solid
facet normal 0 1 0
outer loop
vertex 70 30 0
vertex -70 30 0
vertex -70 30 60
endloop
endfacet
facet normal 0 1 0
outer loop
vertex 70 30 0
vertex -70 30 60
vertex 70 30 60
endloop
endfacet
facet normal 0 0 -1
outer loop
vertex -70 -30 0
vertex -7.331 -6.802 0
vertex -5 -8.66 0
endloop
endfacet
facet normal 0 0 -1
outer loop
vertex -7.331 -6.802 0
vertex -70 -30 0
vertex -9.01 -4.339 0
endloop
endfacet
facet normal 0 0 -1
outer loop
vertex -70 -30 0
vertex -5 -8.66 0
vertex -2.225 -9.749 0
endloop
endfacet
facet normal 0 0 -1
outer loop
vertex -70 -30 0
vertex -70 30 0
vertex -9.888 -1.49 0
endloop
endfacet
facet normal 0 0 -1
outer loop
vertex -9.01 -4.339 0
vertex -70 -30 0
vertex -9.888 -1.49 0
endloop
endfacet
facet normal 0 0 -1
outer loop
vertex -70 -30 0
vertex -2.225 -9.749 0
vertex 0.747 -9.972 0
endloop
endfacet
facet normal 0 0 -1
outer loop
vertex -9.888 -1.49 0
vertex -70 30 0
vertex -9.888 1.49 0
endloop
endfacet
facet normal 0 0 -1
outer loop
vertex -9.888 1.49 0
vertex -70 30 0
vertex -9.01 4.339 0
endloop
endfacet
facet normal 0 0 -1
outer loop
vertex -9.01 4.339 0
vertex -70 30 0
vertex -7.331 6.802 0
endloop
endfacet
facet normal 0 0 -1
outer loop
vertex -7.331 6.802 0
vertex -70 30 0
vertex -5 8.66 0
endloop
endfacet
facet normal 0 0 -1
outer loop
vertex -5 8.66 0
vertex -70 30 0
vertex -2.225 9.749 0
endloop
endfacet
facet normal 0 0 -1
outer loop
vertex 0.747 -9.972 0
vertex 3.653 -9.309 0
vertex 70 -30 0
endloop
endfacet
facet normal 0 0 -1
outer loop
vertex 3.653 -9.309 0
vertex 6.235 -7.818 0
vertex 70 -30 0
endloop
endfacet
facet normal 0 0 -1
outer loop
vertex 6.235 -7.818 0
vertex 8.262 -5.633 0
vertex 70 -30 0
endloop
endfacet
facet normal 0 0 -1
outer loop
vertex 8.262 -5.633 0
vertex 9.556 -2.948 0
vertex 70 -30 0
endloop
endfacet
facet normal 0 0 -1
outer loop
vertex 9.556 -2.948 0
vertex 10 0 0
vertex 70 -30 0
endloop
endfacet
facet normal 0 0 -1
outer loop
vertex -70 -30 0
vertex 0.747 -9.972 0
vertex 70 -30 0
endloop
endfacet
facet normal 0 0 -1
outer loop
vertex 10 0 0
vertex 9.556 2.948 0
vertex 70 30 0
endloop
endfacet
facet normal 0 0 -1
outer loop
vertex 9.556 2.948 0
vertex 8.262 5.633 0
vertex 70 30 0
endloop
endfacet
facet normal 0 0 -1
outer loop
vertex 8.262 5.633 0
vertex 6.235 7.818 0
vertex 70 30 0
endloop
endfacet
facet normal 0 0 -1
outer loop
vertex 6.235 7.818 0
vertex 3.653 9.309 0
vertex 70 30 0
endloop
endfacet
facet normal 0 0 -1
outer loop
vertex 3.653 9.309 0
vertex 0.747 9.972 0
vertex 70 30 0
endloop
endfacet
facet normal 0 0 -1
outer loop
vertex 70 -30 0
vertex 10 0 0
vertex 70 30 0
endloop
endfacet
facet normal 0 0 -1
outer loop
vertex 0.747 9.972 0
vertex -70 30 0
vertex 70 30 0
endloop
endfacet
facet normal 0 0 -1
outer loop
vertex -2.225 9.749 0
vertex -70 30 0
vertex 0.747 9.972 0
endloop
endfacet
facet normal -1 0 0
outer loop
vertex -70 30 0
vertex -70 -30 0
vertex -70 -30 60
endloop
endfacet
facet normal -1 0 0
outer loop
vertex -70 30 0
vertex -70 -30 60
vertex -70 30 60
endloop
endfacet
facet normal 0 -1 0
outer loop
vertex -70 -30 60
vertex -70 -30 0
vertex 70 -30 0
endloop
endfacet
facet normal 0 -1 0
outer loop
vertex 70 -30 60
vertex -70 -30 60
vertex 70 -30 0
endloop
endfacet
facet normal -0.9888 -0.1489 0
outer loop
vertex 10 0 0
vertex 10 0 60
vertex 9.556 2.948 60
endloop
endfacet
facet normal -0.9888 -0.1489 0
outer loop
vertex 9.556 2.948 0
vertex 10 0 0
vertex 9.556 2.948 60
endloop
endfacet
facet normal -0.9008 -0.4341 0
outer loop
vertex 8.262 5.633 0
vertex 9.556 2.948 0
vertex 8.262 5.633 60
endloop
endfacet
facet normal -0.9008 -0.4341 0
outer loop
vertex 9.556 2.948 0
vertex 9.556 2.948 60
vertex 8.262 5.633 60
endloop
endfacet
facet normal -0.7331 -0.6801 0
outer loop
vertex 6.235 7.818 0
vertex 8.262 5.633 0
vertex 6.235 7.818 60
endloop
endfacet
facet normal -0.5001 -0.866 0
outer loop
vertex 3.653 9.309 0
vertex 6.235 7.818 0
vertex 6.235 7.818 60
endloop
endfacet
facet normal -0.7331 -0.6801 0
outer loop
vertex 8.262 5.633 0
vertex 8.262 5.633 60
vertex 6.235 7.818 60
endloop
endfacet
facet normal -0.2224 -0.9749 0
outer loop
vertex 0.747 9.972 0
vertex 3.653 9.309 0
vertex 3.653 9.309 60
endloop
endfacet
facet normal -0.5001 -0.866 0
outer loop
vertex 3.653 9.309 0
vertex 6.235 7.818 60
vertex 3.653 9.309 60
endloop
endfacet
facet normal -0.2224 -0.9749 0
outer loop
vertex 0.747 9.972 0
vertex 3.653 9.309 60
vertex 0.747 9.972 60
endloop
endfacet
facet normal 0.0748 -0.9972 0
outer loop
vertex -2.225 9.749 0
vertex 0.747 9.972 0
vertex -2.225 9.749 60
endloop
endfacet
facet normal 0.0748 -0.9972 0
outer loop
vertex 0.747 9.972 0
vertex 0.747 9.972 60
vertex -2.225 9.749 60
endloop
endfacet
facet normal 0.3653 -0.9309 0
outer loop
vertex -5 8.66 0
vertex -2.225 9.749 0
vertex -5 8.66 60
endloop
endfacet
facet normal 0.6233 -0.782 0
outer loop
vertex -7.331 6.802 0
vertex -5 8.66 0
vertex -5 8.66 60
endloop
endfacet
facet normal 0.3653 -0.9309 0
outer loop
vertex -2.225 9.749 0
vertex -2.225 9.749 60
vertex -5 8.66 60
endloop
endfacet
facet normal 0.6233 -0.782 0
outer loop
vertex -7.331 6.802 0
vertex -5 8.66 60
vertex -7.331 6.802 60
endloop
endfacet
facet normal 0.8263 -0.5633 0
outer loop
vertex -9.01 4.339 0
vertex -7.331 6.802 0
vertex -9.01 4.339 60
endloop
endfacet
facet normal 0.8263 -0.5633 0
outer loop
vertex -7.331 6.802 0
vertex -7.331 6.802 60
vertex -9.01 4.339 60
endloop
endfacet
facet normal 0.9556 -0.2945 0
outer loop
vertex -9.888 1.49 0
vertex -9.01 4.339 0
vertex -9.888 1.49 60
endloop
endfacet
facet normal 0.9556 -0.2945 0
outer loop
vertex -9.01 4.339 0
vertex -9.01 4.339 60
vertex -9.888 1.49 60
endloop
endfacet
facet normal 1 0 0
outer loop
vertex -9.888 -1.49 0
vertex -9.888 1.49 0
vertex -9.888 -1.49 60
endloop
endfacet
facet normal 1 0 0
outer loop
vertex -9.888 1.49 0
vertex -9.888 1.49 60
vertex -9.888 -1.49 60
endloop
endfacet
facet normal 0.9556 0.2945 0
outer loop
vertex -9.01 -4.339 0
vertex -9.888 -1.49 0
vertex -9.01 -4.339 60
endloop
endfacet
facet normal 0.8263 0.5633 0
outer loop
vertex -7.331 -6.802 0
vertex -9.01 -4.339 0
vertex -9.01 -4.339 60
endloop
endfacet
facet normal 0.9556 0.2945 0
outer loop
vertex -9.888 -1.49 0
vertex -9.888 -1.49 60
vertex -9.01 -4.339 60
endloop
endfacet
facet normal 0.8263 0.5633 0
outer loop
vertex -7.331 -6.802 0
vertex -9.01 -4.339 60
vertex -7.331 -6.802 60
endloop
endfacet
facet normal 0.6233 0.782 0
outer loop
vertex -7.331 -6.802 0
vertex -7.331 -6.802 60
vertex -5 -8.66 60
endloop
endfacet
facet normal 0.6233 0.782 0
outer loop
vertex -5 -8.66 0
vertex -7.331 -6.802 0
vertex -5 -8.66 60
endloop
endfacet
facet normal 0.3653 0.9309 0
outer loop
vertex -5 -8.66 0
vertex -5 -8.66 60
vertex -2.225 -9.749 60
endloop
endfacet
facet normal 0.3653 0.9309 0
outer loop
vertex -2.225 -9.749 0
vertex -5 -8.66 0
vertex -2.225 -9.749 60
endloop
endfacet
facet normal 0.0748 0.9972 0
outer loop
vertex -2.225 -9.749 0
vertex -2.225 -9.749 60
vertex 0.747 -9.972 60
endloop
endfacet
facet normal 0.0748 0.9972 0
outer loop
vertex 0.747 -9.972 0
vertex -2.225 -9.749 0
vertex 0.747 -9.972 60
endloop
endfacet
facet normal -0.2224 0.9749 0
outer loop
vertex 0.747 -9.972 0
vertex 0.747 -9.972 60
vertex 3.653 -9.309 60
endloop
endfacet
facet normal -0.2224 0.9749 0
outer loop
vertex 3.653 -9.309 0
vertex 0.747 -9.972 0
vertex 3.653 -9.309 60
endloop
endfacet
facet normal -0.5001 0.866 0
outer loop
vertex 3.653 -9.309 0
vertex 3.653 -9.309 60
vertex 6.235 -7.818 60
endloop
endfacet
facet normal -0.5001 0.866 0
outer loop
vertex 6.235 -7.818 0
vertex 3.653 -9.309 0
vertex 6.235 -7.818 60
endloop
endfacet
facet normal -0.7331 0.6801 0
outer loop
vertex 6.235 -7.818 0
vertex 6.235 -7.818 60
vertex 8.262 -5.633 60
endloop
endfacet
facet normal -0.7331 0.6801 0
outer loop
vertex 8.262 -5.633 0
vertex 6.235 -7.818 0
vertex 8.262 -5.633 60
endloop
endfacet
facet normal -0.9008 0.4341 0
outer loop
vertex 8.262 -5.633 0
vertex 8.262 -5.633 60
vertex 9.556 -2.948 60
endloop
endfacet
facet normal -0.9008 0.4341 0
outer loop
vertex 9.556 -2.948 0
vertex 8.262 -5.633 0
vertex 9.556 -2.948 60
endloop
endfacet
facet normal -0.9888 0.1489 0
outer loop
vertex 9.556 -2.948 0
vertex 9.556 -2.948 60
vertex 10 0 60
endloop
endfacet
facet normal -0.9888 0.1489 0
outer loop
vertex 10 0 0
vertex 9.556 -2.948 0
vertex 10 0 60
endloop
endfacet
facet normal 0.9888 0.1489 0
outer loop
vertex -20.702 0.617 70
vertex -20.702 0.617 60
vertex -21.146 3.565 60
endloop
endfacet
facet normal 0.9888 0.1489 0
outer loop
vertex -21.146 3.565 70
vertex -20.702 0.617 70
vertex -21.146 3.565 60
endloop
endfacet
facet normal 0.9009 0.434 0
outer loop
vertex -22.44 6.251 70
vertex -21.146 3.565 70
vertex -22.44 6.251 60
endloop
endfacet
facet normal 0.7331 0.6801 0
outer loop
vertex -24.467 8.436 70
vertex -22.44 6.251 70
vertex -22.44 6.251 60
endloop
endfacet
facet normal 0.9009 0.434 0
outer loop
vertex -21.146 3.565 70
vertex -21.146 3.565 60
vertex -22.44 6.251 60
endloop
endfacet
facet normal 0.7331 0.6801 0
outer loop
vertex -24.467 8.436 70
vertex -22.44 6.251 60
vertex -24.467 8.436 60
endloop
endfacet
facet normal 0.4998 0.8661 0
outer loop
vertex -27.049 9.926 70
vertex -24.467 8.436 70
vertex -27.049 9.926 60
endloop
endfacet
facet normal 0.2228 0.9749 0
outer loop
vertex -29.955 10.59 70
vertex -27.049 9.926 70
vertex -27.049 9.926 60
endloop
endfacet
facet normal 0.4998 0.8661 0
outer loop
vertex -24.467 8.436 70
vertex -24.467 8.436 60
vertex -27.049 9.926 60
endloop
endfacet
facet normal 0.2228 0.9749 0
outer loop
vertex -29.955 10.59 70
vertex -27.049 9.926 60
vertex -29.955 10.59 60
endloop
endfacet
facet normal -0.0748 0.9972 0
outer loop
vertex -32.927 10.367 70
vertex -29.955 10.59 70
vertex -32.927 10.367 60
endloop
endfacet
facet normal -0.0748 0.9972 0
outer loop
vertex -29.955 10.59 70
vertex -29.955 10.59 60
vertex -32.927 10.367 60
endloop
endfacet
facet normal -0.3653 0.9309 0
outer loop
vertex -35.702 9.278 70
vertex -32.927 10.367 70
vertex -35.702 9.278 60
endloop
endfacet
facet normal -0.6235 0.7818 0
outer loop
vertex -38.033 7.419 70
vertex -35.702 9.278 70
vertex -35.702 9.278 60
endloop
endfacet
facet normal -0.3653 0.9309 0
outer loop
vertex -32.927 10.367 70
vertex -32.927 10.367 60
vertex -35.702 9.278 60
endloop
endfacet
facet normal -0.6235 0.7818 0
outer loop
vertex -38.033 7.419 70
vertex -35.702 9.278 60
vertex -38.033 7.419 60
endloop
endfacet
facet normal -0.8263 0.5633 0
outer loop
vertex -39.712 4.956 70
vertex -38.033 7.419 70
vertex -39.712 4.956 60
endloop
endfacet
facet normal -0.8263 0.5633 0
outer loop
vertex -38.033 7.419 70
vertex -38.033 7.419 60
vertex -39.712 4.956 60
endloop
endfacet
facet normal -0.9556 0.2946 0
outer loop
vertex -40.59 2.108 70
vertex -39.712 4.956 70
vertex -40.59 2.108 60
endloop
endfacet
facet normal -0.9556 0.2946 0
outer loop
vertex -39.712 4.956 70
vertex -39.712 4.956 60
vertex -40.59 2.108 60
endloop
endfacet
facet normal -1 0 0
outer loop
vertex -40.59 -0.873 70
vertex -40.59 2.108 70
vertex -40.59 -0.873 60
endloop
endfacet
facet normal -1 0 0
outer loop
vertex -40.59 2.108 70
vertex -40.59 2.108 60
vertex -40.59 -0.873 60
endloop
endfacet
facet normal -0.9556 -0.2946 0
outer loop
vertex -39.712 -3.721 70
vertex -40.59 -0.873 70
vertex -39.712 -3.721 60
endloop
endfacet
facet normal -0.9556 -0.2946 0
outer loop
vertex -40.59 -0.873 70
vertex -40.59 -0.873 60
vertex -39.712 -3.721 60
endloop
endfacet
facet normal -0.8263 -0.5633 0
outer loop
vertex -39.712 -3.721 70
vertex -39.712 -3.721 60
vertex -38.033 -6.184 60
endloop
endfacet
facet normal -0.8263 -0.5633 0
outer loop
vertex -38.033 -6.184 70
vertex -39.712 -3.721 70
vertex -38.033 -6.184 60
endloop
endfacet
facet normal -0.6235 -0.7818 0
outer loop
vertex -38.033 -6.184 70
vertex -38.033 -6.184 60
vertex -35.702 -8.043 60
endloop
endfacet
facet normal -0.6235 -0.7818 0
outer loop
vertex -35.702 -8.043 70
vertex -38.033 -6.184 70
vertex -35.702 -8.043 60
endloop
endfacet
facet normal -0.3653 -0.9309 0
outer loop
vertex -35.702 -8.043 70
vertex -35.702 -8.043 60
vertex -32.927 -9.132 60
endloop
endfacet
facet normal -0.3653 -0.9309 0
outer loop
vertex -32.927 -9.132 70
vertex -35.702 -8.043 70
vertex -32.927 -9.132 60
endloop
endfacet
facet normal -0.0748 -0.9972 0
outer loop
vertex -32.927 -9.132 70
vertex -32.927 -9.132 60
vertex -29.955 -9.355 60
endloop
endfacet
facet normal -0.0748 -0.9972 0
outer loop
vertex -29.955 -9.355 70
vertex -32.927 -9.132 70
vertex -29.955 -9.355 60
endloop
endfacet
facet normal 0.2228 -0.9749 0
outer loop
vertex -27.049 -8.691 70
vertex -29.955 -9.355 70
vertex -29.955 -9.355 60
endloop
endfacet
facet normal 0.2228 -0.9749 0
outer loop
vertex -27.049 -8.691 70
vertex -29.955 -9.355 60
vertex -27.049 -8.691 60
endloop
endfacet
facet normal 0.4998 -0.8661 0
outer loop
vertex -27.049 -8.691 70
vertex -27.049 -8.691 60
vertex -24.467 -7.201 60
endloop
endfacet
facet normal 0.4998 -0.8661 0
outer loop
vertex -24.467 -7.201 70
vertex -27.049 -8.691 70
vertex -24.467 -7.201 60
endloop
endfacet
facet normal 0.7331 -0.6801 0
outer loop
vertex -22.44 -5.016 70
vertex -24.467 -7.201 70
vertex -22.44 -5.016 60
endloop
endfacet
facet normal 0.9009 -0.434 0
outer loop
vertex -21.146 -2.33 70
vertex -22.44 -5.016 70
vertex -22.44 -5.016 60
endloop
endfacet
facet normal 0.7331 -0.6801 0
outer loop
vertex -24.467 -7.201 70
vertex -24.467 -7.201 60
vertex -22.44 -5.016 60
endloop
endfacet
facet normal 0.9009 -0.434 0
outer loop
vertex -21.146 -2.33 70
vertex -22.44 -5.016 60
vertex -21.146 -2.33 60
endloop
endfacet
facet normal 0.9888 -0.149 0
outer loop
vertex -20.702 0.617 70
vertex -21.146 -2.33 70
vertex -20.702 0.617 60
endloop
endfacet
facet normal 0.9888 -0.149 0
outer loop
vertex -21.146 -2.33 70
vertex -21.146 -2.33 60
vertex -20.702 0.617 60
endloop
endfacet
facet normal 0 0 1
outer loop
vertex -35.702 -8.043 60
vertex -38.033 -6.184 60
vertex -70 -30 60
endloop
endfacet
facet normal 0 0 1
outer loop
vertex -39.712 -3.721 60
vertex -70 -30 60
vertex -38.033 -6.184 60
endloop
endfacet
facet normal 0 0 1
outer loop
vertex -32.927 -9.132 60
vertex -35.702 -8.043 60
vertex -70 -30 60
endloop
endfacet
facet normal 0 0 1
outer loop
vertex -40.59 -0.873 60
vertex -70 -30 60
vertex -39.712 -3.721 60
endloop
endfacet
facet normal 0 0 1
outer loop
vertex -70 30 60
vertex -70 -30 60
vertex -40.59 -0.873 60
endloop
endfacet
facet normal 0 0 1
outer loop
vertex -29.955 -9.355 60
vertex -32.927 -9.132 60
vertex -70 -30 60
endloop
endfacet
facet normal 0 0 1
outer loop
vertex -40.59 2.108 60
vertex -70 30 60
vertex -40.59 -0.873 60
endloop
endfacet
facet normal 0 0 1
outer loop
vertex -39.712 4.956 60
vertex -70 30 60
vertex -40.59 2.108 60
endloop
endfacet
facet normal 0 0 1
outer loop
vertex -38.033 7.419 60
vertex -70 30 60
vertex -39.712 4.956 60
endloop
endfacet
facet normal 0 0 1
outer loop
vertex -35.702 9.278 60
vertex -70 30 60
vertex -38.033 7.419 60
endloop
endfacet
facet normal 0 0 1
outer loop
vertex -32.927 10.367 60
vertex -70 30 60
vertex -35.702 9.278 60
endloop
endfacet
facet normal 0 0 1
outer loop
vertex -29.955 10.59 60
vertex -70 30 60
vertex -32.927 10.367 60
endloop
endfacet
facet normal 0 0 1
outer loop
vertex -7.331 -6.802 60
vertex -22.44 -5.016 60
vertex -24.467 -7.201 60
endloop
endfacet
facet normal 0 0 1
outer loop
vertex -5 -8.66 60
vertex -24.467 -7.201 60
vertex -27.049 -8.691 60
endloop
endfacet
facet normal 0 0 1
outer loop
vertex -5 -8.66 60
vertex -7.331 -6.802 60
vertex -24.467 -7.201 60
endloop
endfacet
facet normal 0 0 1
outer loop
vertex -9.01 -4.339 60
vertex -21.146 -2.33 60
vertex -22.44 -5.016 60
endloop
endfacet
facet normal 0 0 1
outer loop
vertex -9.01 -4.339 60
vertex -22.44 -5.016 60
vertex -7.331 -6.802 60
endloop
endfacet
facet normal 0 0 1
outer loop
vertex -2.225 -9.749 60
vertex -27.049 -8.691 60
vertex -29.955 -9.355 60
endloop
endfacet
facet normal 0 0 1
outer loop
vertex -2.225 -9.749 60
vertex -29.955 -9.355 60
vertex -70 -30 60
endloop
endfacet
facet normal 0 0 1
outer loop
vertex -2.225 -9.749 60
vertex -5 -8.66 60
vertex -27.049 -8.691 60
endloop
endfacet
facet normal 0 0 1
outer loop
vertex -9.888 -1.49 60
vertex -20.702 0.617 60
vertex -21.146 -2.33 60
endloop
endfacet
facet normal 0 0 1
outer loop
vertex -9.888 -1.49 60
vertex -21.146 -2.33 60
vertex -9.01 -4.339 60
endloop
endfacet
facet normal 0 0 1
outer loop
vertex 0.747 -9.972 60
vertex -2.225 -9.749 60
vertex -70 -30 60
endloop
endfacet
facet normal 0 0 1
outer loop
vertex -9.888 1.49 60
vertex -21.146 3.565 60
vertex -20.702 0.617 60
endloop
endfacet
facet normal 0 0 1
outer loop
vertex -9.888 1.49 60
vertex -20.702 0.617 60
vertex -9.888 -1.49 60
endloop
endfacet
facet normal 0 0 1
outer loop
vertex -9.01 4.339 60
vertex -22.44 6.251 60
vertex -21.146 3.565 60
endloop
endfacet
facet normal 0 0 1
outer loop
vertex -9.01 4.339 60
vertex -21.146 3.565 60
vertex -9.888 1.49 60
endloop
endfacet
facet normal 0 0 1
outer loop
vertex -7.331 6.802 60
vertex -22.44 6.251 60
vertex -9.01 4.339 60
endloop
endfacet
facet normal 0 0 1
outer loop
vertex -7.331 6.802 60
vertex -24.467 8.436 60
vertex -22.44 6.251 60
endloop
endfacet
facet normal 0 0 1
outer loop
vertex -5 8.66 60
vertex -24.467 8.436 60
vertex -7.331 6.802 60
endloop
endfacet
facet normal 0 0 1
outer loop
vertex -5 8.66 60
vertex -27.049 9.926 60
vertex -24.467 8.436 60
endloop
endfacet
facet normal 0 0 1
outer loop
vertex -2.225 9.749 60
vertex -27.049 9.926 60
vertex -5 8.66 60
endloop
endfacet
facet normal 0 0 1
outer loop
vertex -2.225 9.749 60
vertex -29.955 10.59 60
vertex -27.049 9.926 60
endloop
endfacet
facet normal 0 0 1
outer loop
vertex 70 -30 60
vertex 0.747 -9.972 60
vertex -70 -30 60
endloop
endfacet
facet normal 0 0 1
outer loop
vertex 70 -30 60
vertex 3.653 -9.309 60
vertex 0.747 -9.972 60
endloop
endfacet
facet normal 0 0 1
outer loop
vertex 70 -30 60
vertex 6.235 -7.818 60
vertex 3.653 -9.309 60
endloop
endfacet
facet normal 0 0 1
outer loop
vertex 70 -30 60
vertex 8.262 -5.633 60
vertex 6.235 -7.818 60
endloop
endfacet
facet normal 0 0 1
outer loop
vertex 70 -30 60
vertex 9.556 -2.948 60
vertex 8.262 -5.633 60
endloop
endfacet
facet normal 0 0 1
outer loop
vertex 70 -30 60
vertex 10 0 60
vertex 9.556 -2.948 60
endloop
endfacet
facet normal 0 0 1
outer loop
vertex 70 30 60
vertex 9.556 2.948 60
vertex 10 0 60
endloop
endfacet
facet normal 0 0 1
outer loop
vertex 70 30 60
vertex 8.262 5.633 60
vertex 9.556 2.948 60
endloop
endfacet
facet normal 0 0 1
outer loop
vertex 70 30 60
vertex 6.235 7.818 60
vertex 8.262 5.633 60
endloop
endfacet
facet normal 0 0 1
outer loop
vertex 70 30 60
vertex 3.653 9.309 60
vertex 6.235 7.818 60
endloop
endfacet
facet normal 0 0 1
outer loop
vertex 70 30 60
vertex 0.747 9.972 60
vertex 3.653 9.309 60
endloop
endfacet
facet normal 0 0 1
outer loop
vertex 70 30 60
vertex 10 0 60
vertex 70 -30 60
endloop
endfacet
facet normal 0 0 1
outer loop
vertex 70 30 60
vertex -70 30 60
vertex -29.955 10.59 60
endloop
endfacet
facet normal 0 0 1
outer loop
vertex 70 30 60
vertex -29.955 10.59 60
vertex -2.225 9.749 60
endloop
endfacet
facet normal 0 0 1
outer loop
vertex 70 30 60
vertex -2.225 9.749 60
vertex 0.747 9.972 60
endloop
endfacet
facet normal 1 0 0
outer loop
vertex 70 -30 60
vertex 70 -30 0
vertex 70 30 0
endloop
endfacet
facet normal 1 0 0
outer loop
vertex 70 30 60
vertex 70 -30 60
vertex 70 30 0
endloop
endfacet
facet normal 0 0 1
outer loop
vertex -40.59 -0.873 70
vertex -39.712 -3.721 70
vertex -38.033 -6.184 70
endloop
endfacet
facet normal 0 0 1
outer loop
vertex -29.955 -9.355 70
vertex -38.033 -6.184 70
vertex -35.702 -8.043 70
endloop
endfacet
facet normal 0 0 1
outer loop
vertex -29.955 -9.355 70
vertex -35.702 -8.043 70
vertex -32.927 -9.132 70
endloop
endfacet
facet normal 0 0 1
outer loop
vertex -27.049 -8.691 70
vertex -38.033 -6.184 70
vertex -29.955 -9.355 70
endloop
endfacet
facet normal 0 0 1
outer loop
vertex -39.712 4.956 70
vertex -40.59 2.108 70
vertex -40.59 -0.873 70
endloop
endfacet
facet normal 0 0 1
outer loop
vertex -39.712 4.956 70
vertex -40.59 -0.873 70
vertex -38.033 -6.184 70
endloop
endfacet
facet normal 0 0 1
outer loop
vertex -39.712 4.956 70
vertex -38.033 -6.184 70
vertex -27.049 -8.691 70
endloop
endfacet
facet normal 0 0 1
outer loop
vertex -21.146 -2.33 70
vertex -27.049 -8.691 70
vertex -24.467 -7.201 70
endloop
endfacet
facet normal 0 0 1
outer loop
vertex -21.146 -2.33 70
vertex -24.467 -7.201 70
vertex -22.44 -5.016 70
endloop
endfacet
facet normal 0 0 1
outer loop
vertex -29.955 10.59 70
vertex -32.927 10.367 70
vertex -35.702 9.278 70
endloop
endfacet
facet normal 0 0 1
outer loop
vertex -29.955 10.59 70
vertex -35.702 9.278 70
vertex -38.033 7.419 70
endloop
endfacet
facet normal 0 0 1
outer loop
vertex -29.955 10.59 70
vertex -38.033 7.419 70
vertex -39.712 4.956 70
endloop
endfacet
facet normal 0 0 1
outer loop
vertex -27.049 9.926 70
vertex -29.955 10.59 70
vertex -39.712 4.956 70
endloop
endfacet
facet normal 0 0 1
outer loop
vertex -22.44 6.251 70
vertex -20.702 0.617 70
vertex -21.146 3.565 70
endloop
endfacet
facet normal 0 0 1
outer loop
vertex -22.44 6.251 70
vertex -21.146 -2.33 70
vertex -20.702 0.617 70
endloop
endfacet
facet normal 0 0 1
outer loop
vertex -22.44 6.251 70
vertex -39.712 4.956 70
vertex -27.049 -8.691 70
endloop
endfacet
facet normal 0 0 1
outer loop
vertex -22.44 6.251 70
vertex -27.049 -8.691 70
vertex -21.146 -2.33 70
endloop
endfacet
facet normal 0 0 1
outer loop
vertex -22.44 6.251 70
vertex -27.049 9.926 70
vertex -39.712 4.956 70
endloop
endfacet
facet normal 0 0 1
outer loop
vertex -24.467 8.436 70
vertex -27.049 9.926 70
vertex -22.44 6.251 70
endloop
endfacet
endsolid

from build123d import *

# Parameters (mm, degrees)
F0_W     = 140
F0_H     = 60
F1_DEPTH = 60
F3_R     = 10
F5_DEPTH = 10
F4_R     = 10
F6_DEPTH = 73.6


with BuildPart() as f1:
    # F0 (on Top) → F1 (new body)
    with BuildSketch(Plane.XY):
        Rectangle(F0_W, F0_H)
    extrude(amount=F1_DEPTH)

    # F3 (on face) → F5 (join)
    with BuildSketch(Plane.XY.offset(60)):
        with Locations((-30.702168, 0.617491)):
            Circle(F3_R)
    extrude(amount=F5_DEPTH)

    # F4 (on face) → F6 (cut)
    with BuildSketch(Plane.XY.offset(60)):
        Circle(F4_R)
    extrude(amount=-F6_DEPTH, mode=Mode.SUBTRACT)


solid = f1.part
